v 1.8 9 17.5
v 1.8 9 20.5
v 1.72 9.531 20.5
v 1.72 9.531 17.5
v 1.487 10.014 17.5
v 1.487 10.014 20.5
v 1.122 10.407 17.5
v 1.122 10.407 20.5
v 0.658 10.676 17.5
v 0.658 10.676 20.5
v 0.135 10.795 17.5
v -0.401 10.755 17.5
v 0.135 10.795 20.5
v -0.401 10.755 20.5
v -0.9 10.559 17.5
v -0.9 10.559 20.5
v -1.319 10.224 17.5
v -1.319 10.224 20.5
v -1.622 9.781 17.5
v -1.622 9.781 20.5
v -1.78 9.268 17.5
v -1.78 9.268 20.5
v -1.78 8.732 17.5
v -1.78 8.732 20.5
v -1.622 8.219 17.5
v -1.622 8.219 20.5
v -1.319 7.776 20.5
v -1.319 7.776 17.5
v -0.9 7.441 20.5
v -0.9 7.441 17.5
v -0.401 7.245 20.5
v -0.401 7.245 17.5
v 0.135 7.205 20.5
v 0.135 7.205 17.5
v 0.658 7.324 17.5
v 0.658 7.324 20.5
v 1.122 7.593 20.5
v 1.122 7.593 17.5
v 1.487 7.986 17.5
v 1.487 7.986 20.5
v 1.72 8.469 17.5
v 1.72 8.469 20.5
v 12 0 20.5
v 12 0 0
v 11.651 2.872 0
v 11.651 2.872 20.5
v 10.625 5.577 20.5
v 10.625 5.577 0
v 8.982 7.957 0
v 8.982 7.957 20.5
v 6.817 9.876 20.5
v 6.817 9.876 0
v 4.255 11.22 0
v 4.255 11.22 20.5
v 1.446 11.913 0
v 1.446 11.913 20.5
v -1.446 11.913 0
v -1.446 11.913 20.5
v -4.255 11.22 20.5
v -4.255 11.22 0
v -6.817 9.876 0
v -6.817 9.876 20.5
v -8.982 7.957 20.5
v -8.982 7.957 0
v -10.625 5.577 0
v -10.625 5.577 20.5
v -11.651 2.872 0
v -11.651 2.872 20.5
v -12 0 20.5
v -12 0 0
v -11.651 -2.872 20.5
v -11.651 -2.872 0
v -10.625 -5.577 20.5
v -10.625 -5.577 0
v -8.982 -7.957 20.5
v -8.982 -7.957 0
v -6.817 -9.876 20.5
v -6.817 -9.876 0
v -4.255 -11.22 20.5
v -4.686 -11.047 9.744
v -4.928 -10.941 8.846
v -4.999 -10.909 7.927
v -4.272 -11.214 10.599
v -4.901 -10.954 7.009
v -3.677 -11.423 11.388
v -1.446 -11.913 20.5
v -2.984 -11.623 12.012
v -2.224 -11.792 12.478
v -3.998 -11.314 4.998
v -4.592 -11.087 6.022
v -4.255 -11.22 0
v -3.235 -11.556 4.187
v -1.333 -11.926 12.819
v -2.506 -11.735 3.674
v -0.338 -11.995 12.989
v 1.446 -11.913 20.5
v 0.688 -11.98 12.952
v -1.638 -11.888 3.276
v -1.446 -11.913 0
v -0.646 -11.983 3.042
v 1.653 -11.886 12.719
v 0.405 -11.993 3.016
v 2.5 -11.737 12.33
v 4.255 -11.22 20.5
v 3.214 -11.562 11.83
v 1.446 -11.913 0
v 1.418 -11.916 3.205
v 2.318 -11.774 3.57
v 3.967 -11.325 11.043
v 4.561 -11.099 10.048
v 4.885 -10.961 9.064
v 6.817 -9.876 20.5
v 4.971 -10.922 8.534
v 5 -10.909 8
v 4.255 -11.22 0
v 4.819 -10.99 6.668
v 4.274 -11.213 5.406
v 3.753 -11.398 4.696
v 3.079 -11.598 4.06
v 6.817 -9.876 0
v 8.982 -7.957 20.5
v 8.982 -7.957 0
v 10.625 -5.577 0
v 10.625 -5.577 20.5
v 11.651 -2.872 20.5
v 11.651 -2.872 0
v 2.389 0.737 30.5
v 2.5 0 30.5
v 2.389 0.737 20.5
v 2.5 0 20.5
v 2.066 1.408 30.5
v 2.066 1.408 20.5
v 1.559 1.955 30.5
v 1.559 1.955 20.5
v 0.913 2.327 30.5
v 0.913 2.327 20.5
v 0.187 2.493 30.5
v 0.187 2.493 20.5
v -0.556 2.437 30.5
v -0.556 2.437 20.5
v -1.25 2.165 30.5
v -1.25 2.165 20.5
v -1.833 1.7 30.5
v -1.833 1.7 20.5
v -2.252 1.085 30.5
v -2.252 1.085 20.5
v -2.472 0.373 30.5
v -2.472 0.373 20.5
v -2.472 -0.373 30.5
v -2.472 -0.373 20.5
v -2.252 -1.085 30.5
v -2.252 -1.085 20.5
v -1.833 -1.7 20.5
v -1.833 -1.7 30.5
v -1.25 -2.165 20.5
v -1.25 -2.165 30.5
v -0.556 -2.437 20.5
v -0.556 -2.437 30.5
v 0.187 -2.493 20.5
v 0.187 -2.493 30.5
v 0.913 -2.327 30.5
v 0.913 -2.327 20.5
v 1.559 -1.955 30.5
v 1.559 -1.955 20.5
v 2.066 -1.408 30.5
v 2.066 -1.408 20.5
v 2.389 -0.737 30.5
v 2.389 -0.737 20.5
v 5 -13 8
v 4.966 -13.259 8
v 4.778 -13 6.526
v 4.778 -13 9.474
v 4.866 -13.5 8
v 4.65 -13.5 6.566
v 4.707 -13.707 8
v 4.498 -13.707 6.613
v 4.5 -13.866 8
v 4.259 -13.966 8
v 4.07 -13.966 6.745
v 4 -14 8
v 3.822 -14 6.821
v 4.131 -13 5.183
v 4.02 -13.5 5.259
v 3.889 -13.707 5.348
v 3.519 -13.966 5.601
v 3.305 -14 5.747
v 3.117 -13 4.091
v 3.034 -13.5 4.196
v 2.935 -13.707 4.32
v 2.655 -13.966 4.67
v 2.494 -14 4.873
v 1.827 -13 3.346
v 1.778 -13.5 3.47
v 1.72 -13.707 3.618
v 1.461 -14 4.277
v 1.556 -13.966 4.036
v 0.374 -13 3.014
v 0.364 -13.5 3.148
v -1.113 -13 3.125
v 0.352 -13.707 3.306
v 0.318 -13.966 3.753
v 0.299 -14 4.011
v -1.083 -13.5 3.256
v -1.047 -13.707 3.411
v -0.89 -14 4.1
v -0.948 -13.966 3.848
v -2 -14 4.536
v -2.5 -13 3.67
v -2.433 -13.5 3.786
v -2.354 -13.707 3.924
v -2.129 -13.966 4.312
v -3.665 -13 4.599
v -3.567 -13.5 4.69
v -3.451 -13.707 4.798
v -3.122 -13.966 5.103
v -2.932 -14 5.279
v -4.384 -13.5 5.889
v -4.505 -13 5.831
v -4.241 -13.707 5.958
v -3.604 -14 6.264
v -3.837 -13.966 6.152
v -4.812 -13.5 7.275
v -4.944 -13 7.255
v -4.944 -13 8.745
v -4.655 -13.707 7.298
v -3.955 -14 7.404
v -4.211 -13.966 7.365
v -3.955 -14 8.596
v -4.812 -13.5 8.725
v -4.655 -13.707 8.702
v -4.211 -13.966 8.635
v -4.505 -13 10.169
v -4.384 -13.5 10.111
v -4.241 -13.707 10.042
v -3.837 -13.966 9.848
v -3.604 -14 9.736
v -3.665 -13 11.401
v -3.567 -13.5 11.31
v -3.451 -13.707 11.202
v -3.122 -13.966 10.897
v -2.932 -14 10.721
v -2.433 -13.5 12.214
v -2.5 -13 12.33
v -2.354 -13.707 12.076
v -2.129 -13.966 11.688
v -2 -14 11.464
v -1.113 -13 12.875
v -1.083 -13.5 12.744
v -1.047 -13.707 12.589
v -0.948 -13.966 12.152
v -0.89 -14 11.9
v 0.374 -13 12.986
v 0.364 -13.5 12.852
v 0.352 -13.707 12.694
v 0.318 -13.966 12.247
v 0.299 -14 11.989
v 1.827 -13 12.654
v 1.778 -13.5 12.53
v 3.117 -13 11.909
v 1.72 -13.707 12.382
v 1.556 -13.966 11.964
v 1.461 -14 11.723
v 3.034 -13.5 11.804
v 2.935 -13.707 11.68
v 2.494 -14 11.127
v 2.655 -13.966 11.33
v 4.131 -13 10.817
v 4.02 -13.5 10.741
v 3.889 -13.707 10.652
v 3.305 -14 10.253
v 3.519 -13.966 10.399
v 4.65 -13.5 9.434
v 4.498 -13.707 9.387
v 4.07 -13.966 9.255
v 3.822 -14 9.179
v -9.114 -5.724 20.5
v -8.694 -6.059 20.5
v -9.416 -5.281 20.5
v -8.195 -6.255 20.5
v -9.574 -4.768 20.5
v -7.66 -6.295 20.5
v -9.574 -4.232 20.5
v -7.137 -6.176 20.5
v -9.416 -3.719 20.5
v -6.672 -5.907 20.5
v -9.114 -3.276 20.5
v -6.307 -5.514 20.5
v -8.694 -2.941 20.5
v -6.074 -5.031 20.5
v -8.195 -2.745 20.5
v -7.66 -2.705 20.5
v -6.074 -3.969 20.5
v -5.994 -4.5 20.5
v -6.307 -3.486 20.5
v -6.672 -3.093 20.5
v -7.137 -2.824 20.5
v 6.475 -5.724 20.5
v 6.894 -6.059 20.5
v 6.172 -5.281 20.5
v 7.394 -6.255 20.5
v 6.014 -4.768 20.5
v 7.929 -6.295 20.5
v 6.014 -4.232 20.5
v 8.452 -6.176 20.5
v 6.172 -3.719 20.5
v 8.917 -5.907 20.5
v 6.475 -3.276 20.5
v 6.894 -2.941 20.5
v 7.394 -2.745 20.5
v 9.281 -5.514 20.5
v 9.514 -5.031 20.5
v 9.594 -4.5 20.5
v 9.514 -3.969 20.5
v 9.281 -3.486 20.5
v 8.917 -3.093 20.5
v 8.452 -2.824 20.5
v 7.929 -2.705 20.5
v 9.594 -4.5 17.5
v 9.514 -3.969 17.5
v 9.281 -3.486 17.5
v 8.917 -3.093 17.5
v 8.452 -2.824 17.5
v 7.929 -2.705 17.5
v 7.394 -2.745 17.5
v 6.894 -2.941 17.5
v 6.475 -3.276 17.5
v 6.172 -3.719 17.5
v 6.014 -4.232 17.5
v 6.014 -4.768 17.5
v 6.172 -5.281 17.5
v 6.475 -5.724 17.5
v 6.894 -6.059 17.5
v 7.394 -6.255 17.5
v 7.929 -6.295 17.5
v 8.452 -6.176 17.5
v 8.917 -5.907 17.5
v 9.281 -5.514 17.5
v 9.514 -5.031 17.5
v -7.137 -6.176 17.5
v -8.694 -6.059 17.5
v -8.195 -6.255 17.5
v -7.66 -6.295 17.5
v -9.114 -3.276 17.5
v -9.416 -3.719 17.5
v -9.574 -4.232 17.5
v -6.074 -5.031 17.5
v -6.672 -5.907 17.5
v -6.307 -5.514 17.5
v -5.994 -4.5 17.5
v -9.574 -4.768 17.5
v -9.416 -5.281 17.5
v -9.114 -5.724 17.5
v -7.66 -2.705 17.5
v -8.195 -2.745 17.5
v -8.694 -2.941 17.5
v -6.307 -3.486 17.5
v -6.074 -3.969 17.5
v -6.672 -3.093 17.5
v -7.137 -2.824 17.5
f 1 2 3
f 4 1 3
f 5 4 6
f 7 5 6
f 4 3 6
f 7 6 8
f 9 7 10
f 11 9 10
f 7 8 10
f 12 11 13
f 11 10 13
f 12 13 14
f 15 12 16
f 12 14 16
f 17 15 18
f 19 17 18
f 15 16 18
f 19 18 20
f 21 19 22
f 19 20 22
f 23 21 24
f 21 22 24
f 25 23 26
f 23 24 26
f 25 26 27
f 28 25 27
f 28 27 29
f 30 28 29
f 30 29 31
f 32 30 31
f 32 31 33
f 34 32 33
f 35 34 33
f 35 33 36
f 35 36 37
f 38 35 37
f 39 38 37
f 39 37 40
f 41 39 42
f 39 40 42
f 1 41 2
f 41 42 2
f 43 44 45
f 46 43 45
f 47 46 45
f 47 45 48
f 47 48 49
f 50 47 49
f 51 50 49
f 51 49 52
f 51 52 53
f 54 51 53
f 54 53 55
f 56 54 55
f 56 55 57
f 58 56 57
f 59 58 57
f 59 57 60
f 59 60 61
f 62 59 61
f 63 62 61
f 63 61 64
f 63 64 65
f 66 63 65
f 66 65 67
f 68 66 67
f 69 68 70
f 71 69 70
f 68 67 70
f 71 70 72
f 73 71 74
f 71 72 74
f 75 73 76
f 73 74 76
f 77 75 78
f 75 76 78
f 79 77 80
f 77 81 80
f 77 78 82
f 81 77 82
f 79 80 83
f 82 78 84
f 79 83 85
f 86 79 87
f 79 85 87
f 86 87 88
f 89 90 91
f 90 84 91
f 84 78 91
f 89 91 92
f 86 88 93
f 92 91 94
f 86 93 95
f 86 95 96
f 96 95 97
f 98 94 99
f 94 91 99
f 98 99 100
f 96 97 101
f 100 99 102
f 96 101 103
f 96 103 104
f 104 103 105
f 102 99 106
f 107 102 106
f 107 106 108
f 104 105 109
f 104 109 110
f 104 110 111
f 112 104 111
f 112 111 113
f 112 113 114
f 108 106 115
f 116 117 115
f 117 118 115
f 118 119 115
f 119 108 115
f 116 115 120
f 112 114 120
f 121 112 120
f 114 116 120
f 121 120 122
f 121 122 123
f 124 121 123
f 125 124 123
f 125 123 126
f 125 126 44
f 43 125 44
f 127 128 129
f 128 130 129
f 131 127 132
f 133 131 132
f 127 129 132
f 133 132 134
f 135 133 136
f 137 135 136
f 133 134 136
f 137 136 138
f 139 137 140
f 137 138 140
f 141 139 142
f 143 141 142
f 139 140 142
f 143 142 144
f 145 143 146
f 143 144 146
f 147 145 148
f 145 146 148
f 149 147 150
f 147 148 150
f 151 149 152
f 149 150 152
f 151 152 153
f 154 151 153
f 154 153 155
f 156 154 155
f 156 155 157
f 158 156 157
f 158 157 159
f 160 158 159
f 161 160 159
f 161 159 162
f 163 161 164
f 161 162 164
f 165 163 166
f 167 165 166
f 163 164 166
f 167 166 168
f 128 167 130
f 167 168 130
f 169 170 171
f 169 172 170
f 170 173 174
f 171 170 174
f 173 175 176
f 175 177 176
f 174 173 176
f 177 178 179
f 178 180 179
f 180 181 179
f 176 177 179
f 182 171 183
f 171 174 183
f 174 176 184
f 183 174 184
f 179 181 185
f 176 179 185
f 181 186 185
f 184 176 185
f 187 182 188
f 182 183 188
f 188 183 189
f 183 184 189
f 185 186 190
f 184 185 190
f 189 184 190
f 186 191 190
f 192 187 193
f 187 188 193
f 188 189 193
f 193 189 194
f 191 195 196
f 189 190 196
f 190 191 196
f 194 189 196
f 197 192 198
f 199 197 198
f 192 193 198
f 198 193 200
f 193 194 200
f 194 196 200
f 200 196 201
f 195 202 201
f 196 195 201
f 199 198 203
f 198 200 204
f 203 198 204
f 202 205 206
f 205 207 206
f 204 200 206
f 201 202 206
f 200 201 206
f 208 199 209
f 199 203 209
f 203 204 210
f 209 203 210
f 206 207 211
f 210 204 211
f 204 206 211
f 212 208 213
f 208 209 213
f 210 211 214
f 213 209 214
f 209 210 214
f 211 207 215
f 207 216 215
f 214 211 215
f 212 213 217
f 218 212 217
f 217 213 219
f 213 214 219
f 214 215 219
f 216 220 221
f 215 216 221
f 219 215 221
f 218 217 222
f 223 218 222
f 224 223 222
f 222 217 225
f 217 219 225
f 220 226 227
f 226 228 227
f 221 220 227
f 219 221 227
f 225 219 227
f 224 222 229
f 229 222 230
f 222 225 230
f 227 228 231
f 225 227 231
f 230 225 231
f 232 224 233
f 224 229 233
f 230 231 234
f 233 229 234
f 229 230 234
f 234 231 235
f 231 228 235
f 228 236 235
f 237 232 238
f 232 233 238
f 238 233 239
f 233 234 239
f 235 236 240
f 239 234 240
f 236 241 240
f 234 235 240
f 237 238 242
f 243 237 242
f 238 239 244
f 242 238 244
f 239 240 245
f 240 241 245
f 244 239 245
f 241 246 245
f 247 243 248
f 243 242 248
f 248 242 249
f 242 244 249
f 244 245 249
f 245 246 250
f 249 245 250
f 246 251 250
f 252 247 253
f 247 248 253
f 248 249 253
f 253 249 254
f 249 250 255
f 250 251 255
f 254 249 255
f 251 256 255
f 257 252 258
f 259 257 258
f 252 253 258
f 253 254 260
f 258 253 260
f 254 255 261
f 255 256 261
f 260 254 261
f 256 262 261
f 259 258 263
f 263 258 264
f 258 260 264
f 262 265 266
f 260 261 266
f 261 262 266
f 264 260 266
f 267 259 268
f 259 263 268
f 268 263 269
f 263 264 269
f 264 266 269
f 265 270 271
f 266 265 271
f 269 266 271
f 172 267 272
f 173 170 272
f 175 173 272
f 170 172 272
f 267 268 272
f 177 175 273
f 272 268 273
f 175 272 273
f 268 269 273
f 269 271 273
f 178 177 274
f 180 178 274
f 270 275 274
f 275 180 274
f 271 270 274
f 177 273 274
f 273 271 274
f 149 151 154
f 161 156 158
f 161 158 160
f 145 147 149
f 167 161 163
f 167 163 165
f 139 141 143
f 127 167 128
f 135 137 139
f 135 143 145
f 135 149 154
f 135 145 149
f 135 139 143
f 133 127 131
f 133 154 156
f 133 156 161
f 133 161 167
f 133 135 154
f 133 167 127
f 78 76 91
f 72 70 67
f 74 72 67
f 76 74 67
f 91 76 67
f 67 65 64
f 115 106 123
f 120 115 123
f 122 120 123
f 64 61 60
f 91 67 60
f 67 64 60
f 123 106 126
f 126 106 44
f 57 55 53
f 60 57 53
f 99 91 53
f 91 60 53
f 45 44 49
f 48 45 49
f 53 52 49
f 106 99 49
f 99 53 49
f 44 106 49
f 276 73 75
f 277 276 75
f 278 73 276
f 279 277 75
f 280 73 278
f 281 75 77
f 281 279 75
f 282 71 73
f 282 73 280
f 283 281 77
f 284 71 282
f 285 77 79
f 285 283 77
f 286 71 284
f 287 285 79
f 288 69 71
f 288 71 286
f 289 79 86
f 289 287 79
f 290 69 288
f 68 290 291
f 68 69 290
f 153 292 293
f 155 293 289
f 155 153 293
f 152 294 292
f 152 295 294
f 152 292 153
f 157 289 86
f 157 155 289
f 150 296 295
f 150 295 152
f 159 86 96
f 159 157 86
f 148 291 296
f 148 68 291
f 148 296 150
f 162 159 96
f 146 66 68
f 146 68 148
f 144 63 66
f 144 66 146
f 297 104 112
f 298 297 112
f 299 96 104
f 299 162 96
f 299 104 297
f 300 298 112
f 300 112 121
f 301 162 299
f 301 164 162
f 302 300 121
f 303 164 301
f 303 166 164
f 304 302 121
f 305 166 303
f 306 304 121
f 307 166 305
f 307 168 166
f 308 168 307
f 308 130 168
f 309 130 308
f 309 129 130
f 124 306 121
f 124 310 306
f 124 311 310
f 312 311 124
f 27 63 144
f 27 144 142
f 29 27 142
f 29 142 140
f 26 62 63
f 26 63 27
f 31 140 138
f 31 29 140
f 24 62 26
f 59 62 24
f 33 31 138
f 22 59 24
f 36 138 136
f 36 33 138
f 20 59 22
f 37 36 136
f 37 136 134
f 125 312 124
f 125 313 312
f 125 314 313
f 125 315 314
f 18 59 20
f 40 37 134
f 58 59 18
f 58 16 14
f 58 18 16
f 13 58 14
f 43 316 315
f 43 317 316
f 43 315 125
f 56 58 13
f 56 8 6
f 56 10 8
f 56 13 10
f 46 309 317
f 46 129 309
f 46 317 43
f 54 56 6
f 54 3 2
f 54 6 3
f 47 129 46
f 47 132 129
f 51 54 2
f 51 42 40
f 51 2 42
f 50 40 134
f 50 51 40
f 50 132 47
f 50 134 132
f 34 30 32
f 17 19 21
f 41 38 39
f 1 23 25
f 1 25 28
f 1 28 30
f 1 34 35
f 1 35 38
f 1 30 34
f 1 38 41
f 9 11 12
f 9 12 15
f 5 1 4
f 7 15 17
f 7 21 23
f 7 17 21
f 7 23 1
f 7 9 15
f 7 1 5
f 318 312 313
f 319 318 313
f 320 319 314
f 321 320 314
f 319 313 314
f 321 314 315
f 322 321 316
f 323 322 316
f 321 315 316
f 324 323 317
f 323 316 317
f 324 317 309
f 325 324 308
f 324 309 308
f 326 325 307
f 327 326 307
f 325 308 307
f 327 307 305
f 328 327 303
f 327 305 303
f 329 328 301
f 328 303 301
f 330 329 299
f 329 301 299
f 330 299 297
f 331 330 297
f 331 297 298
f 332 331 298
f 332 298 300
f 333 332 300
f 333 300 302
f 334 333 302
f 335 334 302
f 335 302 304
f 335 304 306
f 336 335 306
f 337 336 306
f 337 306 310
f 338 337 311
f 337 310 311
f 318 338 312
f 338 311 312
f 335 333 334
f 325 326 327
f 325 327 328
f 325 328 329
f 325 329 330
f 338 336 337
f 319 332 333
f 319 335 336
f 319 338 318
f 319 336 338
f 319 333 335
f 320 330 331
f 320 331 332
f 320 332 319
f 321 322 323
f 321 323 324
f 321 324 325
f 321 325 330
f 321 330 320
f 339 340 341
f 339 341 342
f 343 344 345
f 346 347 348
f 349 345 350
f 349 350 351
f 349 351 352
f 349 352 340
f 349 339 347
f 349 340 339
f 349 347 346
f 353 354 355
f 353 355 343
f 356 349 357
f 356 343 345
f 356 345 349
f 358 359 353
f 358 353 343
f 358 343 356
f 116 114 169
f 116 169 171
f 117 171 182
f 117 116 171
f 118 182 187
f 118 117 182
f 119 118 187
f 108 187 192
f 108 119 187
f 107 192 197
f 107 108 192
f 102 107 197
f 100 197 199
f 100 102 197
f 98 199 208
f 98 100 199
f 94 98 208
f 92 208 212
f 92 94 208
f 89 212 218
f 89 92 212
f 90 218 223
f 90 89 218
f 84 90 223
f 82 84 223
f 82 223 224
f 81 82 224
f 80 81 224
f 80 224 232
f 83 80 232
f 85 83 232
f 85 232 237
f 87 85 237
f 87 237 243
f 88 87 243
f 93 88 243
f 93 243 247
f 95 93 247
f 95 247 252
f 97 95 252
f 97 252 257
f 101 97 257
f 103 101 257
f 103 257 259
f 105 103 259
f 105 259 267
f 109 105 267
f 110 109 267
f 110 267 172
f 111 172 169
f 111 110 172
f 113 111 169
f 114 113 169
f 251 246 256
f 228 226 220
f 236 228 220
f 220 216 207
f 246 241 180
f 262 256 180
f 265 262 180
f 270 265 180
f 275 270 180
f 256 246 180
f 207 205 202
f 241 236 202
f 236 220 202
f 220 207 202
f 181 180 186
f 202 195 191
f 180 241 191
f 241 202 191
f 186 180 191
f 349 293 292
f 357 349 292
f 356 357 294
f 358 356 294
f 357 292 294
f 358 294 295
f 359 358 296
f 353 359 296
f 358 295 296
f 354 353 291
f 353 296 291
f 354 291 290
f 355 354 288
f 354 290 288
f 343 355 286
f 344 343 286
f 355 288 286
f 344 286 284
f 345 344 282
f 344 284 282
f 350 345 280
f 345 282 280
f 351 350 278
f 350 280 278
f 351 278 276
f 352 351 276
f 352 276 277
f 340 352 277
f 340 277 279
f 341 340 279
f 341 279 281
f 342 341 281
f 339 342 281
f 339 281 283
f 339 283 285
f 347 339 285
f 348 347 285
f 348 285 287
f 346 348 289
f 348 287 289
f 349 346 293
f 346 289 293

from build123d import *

# Parameters (mm, degrees)
ESQUISSE1_R             = 12
BOSS_EXTRU_1_DEPTH      = 20.5
ESQUISSE2_R             = 2.5
BOSS_EXTRU_2_DEPTH      = 3.5
ESQUISSE3_R             = 1.8
ENL_V_MAT_EXTRU_1_DEPTH = 3
ESQUISSE4_R             = 2.5
BOSS_EXTRU_3_DEPTH      = 6.5
ESQUISSE5_R             = 5
BOSS_EXTRU_4_DEPTH      = 14
CONG_1_R                = 1


with BuildPart() as part:
    # Esquisse1 → Boss.-Extru.1 (new body)
    with BuildSketch(Plane.XY):
        Circle(ESQUISSE1_R)
    extrude(amount=BOSS_EXTRU_1_DEPTH)

    # Esquisse2 → Boss.-Extru.2 (add)
    with BuildSketch(Plane.XY.offset(20.5)):
        Circle(ESQUISSE2_R)
    extrude(amount=BOSS_EXTRU_2_DEPTH)

    # Esquisse3 → Enlèv. mat.-Extru.1 (cut)
    with BuildSketch(Plane.XY.offset(20.5)):
        with Locations((0, 9)):
            Circle(ESQUISSE3_R)
        with Locations((-7.794228634, -4.5)):
            Circle(ESQUISSE3_R)
        with Locations((7.794228634, -4.5)):
            Circle(ESQUISSE3_R)
    extrude(amount=-ENL_V_MAT_EXTRU_1_DEPTH, mode=Mode.SUBTRACT)

    # Esquisse4 → Boss.-Extru.3 (add)
    with BuildSketch(Plane.XY.offset(24)):
        Circle(ESQUISSE4_R)
    extrude(amount=BOSS_EXTRU_3_DEPTH)

    # Esquisse5 → Boss.-Extru.4 (add)
    with BuildSketch(Plane(origin=(0, 0, 0), x_dir=(1, 0, 0), z_dir=(0, 1, 0))):
        with Locations((0, -8)):
            Circle(ESQUISSE5_R)
    extrude(amount=-BOSS_EXTRU_4_DEPTH)

    # Congé1
    cong_1_edges = [part.edges().sort_by_distance(p)[0] for p in [
        (-5, -14, 8),
    ]]
    fillet(cong_1_edges, radius=CONG_1_R)


solid = part.part
